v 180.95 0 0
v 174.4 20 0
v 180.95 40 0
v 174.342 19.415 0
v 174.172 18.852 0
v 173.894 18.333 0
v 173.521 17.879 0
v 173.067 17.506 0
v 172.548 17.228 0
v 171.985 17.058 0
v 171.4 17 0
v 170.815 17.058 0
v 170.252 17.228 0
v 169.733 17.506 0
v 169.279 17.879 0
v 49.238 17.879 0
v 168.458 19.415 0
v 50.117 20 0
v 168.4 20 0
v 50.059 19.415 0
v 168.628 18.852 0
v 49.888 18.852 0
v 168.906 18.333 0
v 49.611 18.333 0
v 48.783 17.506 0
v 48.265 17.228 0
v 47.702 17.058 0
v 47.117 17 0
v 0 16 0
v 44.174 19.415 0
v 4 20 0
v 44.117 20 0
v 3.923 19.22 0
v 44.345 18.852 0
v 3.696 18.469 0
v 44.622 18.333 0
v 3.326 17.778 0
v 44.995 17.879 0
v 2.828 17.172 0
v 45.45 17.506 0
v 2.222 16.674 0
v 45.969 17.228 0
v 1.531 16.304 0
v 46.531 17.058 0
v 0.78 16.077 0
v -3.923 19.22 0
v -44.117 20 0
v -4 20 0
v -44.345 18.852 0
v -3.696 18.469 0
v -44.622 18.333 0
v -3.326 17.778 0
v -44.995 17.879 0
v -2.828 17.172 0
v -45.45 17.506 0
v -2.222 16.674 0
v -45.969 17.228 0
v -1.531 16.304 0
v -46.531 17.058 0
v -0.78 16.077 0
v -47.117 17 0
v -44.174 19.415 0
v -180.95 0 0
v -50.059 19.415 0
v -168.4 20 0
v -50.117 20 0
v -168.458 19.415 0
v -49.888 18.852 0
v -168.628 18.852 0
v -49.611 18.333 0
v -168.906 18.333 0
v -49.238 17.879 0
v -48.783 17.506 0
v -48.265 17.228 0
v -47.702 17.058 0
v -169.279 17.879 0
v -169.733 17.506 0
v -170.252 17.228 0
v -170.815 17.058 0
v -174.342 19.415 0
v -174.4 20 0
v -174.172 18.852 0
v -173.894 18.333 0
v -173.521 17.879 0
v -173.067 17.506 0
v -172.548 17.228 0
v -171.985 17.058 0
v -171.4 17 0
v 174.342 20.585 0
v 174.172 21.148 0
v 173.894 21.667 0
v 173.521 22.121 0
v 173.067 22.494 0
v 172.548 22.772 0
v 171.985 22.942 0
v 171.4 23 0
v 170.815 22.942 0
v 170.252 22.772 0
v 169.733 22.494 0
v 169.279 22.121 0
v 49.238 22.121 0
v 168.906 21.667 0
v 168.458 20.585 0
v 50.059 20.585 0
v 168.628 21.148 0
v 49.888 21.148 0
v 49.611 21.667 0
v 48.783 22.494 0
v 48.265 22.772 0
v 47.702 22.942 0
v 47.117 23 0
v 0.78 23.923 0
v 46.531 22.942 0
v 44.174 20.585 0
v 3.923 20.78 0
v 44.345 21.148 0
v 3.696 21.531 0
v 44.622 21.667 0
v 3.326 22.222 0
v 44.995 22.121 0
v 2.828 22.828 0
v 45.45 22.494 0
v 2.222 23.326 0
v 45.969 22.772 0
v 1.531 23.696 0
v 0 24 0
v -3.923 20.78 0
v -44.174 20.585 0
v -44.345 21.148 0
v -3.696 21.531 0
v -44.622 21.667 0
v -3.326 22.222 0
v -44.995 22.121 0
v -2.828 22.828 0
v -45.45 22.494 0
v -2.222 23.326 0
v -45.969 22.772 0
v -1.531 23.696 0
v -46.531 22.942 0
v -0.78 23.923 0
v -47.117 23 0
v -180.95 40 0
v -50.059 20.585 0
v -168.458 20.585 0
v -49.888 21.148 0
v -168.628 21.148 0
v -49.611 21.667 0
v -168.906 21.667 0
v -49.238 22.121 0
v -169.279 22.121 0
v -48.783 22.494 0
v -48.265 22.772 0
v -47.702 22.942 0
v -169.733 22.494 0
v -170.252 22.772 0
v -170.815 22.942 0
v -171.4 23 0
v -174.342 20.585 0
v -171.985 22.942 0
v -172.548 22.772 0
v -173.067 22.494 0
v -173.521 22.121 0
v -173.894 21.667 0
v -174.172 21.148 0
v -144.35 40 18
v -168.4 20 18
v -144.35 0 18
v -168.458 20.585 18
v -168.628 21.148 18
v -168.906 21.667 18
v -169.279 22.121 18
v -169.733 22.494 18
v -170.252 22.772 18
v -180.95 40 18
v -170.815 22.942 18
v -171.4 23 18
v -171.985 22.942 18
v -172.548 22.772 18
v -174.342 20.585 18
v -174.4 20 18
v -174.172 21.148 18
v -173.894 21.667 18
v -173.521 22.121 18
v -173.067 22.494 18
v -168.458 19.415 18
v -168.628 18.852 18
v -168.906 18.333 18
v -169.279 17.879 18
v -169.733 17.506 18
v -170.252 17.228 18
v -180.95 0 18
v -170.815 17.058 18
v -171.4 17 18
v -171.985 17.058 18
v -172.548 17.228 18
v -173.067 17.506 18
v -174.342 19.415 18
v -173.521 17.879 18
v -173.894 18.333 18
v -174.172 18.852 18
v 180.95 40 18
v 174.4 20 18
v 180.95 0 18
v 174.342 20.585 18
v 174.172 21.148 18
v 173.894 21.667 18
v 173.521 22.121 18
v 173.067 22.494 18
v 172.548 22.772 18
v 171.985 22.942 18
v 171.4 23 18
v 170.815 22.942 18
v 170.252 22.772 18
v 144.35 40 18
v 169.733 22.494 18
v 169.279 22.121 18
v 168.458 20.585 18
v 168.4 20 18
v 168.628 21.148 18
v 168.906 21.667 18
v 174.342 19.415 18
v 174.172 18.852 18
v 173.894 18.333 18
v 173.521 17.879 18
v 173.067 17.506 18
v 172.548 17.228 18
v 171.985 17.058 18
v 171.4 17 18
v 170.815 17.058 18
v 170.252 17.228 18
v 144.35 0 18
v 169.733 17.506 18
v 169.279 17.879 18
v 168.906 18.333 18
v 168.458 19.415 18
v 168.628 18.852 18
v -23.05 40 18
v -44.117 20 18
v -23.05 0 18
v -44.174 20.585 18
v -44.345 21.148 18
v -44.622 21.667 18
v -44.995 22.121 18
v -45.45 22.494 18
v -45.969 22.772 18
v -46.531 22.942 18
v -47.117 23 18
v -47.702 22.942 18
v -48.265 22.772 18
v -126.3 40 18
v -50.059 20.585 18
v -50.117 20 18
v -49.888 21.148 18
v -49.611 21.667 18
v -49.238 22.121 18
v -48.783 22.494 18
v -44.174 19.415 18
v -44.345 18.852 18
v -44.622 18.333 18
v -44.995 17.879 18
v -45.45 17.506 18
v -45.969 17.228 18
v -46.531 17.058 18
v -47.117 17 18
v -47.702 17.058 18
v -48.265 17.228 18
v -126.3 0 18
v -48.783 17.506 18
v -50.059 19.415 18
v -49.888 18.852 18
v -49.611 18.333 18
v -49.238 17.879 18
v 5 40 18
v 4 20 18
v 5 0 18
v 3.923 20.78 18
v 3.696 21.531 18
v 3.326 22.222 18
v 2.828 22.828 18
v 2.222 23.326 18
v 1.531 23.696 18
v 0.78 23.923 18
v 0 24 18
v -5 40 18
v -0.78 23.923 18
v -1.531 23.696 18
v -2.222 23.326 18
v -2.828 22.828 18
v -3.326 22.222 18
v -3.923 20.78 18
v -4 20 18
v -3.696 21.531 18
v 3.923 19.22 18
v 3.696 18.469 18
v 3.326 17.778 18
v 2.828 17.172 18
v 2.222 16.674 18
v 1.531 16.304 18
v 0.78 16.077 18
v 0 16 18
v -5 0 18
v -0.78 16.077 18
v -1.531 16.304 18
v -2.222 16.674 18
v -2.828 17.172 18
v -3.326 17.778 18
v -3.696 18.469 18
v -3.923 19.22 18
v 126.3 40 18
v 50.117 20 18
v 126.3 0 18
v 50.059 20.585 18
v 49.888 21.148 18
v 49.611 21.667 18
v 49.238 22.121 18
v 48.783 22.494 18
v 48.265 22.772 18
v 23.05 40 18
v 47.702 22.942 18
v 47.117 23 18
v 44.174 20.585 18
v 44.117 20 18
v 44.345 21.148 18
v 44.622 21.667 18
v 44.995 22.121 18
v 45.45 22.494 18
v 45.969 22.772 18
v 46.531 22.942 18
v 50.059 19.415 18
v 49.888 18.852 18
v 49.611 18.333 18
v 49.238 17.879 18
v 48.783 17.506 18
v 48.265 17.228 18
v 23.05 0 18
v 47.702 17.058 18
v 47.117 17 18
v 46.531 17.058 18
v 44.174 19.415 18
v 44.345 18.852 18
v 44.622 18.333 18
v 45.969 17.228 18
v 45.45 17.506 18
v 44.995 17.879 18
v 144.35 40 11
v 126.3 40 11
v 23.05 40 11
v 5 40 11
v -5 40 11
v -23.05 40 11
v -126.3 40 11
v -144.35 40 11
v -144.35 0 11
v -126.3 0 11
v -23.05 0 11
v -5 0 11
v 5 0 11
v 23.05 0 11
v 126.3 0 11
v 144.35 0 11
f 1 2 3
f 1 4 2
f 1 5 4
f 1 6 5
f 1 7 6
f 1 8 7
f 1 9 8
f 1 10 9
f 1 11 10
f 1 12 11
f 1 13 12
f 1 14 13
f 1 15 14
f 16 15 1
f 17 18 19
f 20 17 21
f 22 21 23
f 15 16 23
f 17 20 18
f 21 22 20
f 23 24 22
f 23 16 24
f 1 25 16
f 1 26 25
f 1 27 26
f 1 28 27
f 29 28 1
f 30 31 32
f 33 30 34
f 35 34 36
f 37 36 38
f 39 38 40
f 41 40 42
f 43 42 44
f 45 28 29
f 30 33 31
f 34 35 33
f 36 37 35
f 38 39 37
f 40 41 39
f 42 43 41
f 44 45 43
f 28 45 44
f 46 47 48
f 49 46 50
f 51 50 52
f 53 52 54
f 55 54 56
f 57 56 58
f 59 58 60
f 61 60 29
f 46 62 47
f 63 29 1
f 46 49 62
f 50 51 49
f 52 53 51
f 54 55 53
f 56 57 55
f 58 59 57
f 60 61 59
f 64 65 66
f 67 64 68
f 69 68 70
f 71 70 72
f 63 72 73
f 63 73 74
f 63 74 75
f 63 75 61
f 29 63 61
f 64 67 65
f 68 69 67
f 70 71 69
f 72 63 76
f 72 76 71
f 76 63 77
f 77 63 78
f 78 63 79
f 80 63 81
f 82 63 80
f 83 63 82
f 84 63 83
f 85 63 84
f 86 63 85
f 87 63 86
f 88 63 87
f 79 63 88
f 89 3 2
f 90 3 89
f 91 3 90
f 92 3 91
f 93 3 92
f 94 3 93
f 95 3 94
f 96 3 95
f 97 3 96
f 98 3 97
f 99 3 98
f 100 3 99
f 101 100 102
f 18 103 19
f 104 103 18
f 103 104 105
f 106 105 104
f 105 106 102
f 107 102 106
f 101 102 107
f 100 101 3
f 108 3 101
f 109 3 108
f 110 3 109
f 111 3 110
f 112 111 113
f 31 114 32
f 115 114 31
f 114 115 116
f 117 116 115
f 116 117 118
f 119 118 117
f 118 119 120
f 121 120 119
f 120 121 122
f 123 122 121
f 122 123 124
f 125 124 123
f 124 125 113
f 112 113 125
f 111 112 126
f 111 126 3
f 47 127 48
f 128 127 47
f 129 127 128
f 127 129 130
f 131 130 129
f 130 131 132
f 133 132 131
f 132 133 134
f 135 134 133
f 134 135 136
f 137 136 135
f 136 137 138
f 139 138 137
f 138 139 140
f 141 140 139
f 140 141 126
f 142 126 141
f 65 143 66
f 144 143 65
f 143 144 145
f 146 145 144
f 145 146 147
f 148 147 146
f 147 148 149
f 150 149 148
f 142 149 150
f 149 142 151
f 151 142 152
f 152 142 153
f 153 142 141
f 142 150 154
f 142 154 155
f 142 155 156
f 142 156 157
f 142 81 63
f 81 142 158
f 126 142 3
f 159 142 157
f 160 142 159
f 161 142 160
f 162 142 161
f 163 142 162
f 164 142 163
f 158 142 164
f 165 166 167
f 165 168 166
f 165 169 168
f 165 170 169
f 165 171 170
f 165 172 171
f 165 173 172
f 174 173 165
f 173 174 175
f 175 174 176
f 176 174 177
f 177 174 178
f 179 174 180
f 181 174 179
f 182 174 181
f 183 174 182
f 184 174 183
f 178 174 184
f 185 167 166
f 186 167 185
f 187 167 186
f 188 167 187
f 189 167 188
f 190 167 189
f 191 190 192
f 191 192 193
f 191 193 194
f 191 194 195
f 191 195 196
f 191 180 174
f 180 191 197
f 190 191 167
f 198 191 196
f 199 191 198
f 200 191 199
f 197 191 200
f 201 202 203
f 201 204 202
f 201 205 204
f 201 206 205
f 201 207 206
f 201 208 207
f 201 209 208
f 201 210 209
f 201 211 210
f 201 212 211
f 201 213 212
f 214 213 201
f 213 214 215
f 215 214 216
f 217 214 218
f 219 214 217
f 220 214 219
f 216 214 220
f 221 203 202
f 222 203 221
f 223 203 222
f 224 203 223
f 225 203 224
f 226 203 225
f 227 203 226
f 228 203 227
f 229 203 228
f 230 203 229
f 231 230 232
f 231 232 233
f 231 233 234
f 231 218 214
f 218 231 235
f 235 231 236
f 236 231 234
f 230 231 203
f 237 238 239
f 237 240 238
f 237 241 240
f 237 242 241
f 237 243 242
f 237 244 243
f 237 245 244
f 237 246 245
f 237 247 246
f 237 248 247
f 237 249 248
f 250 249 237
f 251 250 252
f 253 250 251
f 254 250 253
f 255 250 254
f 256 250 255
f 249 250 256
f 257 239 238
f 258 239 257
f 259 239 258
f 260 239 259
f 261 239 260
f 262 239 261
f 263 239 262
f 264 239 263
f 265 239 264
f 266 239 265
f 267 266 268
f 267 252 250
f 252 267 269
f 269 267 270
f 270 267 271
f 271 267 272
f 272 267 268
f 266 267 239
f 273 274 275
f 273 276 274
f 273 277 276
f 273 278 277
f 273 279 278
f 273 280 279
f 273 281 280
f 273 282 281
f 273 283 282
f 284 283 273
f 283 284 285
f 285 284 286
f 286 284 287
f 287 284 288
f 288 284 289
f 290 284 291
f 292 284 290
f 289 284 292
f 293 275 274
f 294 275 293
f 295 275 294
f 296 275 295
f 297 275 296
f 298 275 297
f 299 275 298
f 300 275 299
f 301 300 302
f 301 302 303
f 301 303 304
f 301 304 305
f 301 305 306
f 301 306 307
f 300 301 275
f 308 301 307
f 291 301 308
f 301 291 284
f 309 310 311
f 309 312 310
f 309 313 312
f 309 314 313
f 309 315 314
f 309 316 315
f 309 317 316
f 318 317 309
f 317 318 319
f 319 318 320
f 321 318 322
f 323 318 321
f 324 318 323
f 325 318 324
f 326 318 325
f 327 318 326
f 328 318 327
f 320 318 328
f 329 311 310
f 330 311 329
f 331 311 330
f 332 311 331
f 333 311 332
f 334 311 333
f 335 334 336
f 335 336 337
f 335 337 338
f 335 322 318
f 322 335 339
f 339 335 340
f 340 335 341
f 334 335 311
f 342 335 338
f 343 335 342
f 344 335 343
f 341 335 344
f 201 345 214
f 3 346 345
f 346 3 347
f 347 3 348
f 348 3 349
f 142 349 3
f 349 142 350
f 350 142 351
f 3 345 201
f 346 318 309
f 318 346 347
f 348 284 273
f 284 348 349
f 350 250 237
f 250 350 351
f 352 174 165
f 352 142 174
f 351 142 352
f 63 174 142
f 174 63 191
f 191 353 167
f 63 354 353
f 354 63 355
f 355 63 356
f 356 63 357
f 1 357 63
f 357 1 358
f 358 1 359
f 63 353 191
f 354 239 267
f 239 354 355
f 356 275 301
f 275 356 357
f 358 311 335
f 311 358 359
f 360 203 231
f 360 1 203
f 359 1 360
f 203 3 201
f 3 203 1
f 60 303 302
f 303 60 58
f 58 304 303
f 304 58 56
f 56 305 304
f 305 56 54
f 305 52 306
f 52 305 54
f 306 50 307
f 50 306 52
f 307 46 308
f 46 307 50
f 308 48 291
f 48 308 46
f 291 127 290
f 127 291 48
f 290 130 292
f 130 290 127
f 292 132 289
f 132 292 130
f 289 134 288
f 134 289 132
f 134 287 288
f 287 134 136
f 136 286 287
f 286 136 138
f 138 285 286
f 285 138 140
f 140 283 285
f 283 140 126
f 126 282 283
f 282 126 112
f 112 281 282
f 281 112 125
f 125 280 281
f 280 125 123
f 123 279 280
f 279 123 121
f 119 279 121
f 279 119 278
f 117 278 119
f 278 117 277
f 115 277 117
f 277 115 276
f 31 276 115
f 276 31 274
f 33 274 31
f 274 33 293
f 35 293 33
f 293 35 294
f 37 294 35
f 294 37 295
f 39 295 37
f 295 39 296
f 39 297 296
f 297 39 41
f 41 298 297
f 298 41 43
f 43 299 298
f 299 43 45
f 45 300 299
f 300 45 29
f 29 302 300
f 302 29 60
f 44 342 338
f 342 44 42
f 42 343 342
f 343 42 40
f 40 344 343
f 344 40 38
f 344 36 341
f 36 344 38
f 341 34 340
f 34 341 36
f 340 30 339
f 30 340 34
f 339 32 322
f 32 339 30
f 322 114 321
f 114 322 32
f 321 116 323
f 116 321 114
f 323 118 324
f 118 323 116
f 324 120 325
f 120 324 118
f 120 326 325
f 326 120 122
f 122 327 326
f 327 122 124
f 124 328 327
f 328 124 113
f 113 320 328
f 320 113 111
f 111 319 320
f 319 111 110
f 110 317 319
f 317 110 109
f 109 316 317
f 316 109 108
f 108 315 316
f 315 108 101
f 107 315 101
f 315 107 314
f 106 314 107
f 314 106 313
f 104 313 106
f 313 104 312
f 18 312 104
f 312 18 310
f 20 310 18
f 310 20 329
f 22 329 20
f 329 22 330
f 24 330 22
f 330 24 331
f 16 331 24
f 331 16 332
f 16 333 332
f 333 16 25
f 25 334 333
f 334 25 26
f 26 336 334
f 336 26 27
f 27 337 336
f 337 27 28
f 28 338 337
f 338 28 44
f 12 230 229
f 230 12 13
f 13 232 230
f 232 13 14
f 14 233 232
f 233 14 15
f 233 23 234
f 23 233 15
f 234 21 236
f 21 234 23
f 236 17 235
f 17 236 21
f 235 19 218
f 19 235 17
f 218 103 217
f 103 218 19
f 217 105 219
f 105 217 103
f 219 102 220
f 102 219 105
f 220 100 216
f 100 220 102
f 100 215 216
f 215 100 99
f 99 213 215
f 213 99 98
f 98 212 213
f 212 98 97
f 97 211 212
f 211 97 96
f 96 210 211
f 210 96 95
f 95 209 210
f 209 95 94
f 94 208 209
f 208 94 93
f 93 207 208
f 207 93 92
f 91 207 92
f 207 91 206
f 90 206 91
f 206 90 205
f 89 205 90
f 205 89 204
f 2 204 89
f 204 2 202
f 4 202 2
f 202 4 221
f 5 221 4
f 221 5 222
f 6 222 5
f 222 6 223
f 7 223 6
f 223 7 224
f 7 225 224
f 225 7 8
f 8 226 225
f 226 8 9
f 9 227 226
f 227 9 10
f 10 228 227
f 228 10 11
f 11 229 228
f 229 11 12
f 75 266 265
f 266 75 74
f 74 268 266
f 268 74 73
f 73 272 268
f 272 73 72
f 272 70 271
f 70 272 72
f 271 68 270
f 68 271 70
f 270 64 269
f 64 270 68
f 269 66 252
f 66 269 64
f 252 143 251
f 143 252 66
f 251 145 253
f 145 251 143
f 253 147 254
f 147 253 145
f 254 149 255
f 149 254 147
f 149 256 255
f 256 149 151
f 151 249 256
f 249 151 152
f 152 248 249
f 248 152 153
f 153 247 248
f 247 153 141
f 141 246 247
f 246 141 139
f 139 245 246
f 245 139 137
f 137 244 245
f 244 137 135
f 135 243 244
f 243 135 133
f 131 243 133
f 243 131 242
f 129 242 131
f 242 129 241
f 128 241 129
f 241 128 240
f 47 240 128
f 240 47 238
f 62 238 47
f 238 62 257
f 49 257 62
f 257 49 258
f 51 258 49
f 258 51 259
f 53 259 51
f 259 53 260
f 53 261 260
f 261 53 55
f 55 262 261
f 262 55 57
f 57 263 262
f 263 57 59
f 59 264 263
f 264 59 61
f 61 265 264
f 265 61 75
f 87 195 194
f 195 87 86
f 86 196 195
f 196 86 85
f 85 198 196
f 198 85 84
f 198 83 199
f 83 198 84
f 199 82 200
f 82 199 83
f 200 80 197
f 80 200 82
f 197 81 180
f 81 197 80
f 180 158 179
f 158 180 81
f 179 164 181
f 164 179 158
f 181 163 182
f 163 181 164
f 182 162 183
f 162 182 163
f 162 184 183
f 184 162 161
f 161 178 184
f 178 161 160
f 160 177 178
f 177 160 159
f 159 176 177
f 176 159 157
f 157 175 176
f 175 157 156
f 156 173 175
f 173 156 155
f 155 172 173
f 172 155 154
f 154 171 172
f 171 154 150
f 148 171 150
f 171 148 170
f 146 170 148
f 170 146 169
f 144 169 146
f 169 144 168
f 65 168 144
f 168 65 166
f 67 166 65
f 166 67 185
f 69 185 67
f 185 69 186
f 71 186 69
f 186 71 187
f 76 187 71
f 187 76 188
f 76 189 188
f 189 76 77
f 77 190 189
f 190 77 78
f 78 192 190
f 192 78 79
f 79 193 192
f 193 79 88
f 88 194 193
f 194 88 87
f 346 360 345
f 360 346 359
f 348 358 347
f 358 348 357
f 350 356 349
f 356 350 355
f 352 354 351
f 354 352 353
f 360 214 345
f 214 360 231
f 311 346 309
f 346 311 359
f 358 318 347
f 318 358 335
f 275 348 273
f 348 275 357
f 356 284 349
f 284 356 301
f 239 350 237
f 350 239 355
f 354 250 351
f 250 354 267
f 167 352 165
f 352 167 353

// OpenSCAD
// file: volleyball_pole_rack.scad
back_thickness = 18.05;
back_rabbet = 4;
vertical_thickness = 18.05;
lip_size = 4;

pole_dia = 3.75 * 25.4;
pole_spacing = vertical_thickness*2+10;

edge_spacing = 16;

w = pole_dia*2 + pole_spacing + lip_size * 3 + vertical_thickness;
h = back_thickness + lip_size + pole_dia;
inner_height = 40;
back_width = w + pole_dia;


module Profile() {
  difference() {
    translate([-back_width/2,0]) square([back_width,h]);
    for(x_scale=[1,-1]) scale([x_scale,1])
      for(x=[(pole_dia+pole_spacing)/2+lip_size, (pole_dia+pole_spacing)/2+vertical_thickness+pole_dia+lip_size*3])
        translate([x,0]) hull() {
      for(y=[pole_dia/2+back_thickness+lip_size,pole_dia+back_thickness+lip_size])
      translate([0,y])
        circle(d=pole_dia,$fn=256);
    }
  }
}

module Rabbets() {
  for(x_scale=[1,-1]) scale([x_scale,1]) {
    translate([pole_spacing/2+pole_dia+lip_size*2,0]) square([vertical_thickness,h+4]);
    translate([-pole_spacing/2,0]) square([vertical_thickness,h+4]);
  }
  translate([-back_width/2-4,0]) square([back_width+8,back_thickness]);
  translate([-pole_spacing/2,h-back_thickness])
    square([pole_spacing,back_thickness+4]);
}

module RabbetsHole() {
  t = pole_spacing-vertical_thickness*2;
  translate([-t/2,back_thickness]) square([t,h-back_thickness*2]);
}

module SpikeBox(dims, cutter_dia) {
  off = 0.78 * cutter_dia / 2;
  translate([dims[0]/2,0]) {
    square(dims, center=true);
    for(x_scale=[1,-1], y_scale=[1,-1])
      translate([(dims[0]/2-off)*x_scale, (dims[1]/2-off)*y_scale])
      circle(d=cutter_dia,$fn=64);
  }
}

module Vertical(center_cutout=true) {
  difference() {
    square([h-back_thickness-(center_cutout?vertical_thickness-back_rabbet:0)+back_rabbet,inner_height]);
  }
}

module Back() {
  difference() {
    translate([-back_width/2,0]) square([back_width,inner_height]);
    translate([0,inner_height/2]) circle(d=8,$fn=32);
    for(x_scale=[1,-1]) scale([x_scale,1]) {
      translate([(pole_dia+pole_spacing)/3,inner_height/2]) circle(d=6,$fn=32);
      translate([pole_dia+pole_spacing+vertical_thickness+lip_size*3,inner_height/2]) circle(d=6,$fn=32);
    }

    for(x_scale=[1,-1]) translate([16*25.4/2*x_scale,inner_height/2]) circle(d=6,$fn=32);
  }
}

module BackRabbets() {
  intersection() {
    translate([0,-30]) Rabbets();
    translate([-back_width/2,-5]) square([back_width,inner_height+10]);
  }
}

module Spinner() {
  r=pole_dia+pole_spacing/2;
  difference() {
    offset(r=8,$fn=32) offset(delta=-8) intersection() {
      circle(r=r,$fn=256);
      hull() {
        circle(d=pole_spacing,$fn=32);
        translate([r,10]) circle(d=pole_spacing,$fn=32);
        translate([-r,10]) circle(d=pole_spacing,$fn=32);
        translate([r,r]) circle(d=pole_spacing,$fn=32);
        translate([-r,r]) circle(d=pole_spacing,$fn=32);
      }
    }
    circle(d=8,$fn=32);
  }
}

module HBone(_w,_h,d) {
  _t=1.41*d/4;
  square([_w,_h]);
  for(x=[_t,_w-_t])
  for(y=[_t,_h-_t])
    translate([x,y]) circle(d=d,$fn=32);
}

module SpinnerPocket() {
  translate([-199/2,-19.3/2]) HBone(199,15.5,4.1);
}

module Front() {
  intersection() {
    Back();
    translate([-pole_spacing/2,0]) square([pole_spacing, inner_height]);
  }
}

module FrontRabbets() {
  intersection() {
    BackRabbets();
    translate([-pole_spacing/2,-5]) square([pole_spacing,inner_height+10]);
  }
}
// main file
include <volleyball_pole_rack.scad>;

difference() {
  linear_extrude(height=18) Back();
  #translate([0,0,17-6]) linear_extrude(height=10,convexity=10) offset(r=2) offset(delta=-2) BackRabbets();
}
